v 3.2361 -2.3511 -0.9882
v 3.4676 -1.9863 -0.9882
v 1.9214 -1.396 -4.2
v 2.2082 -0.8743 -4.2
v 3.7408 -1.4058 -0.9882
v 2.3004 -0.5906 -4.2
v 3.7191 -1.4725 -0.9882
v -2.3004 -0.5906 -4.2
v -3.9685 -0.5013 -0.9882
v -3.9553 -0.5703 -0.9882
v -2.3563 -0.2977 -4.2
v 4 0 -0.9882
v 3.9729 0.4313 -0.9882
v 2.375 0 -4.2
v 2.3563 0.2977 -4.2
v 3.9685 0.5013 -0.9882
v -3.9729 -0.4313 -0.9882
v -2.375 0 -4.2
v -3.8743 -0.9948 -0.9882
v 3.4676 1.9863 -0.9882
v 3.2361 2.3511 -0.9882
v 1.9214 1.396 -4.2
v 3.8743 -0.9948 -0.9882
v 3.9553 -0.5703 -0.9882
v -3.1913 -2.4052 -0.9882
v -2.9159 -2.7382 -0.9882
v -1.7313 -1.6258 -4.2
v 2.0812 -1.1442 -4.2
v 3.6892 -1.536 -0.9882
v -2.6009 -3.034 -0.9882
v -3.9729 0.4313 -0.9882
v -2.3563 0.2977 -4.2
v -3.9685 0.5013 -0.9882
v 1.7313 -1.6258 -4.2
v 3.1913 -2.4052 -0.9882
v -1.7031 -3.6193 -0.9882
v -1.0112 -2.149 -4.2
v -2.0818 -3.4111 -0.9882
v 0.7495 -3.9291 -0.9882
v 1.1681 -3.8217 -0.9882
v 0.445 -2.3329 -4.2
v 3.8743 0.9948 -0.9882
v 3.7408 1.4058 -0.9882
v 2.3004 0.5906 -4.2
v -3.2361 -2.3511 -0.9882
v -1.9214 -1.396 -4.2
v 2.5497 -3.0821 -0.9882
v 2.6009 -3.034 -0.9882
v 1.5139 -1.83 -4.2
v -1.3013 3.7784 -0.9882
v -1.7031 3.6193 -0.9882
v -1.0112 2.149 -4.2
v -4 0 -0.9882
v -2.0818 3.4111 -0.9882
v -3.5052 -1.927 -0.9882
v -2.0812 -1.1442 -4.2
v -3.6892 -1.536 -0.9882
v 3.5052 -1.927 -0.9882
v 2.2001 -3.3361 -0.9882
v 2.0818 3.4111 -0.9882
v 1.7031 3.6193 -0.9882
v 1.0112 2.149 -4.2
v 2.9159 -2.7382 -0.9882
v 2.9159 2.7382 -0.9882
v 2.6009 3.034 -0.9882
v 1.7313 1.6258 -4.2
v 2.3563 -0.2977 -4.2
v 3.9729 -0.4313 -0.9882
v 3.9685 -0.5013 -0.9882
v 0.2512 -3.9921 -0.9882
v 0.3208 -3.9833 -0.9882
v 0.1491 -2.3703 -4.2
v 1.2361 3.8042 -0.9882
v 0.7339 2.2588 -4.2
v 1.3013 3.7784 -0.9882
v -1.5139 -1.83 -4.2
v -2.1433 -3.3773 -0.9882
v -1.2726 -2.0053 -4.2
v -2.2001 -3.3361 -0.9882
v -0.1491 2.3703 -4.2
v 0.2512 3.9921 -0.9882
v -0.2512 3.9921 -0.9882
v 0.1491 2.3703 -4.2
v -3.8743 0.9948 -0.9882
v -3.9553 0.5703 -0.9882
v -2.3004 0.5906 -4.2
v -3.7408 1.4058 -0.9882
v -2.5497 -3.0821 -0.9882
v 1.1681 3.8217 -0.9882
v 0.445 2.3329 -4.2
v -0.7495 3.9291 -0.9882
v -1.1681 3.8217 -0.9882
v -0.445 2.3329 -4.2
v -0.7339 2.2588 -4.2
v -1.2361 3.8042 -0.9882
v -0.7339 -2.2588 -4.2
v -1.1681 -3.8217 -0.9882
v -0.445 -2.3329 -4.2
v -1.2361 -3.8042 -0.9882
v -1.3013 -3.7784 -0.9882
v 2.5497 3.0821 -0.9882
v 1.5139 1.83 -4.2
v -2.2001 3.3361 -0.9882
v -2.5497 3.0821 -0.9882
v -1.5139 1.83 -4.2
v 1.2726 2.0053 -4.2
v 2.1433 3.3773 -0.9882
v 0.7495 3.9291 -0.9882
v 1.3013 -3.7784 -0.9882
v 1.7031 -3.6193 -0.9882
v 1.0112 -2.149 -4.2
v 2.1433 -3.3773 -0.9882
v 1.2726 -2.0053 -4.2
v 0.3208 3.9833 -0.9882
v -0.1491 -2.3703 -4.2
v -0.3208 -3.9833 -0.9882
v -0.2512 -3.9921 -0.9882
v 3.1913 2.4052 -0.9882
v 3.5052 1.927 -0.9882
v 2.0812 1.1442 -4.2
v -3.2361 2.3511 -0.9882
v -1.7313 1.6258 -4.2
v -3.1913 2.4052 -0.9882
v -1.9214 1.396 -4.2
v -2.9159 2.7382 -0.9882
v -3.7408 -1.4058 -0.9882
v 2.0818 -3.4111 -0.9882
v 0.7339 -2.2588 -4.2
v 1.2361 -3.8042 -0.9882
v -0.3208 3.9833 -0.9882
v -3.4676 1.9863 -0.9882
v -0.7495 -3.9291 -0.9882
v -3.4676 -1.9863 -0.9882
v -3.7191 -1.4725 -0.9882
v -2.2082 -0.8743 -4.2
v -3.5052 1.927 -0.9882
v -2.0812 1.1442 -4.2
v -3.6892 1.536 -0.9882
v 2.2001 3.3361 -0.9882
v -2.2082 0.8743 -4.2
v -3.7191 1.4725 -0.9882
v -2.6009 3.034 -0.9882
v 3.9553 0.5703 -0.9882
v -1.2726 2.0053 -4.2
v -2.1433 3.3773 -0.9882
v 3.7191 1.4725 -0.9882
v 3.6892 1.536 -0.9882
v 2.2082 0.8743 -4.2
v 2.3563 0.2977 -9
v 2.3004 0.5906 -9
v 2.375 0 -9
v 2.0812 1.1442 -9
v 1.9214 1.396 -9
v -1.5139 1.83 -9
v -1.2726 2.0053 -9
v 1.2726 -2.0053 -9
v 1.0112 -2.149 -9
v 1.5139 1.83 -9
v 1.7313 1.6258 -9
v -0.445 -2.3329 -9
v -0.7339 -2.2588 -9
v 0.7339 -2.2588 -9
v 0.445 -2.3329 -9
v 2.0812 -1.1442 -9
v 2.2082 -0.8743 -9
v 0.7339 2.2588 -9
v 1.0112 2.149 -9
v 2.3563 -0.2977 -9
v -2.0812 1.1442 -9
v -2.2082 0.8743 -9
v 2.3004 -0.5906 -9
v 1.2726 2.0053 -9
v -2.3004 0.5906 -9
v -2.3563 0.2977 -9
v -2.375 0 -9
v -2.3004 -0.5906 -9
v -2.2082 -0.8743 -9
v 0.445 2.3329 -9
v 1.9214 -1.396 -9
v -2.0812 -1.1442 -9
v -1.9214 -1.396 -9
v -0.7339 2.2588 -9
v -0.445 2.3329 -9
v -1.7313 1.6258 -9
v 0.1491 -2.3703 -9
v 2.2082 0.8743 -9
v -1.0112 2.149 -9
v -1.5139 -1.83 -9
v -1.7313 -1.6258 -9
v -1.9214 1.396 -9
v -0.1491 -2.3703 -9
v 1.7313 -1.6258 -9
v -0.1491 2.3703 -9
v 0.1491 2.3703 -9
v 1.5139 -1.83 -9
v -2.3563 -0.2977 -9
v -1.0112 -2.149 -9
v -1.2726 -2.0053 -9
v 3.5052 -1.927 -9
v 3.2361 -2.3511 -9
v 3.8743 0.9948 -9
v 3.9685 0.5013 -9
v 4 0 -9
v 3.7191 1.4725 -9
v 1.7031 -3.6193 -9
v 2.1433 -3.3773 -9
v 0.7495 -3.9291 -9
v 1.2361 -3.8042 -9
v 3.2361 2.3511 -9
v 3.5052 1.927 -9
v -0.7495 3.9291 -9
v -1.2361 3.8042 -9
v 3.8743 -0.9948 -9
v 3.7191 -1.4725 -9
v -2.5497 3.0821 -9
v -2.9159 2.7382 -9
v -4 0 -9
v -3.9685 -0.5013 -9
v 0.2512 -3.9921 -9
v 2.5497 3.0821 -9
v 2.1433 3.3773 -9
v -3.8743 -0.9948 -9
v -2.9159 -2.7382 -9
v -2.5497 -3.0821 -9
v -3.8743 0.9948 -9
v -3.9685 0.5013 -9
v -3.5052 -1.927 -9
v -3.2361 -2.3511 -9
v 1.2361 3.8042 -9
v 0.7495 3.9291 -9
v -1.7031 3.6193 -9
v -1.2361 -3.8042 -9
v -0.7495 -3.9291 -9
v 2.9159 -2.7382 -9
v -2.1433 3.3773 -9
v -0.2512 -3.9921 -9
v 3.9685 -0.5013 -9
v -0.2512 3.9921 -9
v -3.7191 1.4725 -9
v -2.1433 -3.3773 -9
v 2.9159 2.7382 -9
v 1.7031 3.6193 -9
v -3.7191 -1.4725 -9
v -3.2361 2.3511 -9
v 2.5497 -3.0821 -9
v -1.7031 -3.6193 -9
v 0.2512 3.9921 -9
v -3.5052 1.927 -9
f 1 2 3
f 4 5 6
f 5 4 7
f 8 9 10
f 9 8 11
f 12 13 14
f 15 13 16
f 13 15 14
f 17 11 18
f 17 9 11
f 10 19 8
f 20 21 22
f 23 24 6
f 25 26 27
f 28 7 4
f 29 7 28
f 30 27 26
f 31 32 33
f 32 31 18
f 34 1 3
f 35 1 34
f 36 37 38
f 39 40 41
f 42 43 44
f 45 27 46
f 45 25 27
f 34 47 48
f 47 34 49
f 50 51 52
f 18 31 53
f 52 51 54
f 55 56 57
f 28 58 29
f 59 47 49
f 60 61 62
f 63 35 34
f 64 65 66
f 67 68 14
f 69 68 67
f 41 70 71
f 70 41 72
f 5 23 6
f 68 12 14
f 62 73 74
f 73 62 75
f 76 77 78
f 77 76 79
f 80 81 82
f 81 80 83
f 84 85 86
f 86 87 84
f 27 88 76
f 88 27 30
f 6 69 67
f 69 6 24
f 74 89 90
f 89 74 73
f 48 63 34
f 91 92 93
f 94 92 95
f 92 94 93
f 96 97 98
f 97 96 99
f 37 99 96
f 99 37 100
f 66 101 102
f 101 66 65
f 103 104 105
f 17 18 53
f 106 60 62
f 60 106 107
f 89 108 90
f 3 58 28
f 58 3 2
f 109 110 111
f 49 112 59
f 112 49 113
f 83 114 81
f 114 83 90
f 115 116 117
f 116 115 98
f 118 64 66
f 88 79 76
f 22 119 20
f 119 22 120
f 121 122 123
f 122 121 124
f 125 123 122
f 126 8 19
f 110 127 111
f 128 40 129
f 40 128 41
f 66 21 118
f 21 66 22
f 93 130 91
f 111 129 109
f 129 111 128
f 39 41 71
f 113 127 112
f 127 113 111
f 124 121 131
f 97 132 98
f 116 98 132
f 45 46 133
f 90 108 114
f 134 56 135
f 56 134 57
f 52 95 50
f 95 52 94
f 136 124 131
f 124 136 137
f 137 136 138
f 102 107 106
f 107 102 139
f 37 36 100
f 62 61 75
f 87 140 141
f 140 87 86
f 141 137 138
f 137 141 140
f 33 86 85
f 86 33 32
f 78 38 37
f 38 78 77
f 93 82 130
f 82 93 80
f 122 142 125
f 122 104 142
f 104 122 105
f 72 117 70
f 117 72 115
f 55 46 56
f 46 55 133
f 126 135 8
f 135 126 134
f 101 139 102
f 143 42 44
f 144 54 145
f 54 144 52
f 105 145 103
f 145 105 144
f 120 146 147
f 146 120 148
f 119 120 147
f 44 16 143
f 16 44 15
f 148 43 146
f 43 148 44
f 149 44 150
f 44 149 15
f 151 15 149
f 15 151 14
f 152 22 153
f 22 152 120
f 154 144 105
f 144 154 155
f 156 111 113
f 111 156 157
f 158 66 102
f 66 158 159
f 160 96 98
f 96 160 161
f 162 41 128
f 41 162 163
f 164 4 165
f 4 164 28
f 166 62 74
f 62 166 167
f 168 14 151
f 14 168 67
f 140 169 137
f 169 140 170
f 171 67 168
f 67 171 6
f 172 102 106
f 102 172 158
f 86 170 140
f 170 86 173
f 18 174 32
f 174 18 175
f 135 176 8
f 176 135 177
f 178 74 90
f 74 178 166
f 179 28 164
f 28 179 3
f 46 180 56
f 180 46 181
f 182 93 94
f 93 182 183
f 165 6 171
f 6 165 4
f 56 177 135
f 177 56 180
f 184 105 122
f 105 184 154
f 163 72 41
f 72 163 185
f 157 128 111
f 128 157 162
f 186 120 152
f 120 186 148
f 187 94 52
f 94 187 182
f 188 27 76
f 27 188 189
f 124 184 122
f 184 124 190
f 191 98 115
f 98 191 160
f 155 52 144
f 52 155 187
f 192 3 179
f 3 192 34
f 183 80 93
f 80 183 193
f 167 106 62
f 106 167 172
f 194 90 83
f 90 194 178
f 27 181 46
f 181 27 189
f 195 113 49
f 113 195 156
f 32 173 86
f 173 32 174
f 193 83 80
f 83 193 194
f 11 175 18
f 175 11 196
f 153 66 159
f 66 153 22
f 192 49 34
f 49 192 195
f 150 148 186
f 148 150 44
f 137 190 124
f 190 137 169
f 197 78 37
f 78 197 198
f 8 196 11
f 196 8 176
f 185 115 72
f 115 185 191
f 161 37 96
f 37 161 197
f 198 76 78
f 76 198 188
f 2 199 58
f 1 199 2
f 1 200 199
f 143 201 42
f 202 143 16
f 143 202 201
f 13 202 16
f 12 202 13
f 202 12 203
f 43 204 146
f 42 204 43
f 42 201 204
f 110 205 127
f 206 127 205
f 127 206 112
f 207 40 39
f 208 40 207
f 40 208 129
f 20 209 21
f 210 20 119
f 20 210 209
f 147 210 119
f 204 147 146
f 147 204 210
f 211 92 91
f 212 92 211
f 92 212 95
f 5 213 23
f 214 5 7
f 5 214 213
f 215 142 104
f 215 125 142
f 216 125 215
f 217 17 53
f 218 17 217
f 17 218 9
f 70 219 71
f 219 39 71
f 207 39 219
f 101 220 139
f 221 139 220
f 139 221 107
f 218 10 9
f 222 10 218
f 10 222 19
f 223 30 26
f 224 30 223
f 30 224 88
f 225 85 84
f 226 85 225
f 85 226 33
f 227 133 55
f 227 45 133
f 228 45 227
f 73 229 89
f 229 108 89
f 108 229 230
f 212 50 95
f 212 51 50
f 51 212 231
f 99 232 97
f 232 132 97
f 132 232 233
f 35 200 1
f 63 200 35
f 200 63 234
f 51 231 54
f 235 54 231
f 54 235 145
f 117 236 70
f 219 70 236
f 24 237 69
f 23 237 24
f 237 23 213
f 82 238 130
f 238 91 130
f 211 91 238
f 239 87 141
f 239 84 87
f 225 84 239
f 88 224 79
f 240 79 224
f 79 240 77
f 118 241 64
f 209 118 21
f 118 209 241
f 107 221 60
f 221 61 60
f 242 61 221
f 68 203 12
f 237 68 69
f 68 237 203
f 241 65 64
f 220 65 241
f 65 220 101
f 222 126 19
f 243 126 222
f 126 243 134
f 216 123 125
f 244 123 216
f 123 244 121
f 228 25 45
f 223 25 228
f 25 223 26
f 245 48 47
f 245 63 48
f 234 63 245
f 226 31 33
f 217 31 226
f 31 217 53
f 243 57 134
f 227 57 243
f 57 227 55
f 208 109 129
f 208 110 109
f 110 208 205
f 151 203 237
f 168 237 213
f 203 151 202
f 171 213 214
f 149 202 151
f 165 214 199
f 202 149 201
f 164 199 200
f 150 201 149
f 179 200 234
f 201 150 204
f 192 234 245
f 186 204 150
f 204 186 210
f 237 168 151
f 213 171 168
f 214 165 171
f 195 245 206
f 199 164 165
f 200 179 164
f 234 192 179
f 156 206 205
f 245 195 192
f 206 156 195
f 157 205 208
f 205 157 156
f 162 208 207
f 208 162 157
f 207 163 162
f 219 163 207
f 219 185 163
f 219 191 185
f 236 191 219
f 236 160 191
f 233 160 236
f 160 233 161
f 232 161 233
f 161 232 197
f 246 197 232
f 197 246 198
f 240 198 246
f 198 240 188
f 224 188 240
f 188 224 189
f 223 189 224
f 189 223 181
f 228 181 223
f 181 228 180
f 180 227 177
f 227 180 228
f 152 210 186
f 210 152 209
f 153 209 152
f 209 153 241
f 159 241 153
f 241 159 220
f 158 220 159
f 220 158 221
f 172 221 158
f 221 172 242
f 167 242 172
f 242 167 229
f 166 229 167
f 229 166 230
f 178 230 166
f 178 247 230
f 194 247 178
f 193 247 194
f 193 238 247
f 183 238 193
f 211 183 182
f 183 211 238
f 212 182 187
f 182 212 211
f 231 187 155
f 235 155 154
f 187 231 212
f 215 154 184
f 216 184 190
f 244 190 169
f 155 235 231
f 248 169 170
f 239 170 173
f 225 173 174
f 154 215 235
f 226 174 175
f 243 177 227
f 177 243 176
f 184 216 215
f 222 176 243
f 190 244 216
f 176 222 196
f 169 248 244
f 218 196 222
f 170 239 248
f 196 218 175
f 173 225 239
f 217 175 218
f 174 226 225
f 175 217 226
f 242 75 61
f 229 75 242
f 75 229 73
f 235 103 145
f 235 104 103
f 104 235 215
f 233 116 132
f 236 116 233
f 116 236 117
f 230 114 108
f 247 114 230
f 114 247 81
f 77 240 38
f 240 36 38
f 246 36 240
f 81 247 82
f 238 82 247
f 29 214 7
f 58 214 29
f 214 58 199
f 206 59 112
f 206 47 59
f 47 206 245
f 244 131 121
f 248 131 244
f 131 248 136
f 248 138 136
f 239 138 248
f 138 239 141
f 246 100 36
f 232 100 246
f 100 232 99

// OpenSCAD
$fn = 50;

difference() {
	union() {
		translate(v = [0, 0, -9.0]) {
			cylinder(h = 12, r = 4.0);
		}
	}
	union() {
		translate(v = [0, 0, 0]) {
			rotate(a = [0, 0, 0]) {
				difference() {
					union() {
						translate(v = [0, 0, -12.0]) {
							cylinder(h = 12, r = 2.25);
						}
						translate(v = [0, 0, -4.2]) {
							cylinder(h = 4.2, r1 = 2.375, r2 = 4.5);
						}
						translate(v = [0, 0, -12.0]) {
							cylinder(h = 12, r = 2.375);
						}
						translate(v = [0, 0, -12.0]) {
							cylinder(h = 12, r = 2.25);
						}
					}
					union();
				}
			}
		}
		#cylinder(h = 3, r = 5.0);
	}
}
